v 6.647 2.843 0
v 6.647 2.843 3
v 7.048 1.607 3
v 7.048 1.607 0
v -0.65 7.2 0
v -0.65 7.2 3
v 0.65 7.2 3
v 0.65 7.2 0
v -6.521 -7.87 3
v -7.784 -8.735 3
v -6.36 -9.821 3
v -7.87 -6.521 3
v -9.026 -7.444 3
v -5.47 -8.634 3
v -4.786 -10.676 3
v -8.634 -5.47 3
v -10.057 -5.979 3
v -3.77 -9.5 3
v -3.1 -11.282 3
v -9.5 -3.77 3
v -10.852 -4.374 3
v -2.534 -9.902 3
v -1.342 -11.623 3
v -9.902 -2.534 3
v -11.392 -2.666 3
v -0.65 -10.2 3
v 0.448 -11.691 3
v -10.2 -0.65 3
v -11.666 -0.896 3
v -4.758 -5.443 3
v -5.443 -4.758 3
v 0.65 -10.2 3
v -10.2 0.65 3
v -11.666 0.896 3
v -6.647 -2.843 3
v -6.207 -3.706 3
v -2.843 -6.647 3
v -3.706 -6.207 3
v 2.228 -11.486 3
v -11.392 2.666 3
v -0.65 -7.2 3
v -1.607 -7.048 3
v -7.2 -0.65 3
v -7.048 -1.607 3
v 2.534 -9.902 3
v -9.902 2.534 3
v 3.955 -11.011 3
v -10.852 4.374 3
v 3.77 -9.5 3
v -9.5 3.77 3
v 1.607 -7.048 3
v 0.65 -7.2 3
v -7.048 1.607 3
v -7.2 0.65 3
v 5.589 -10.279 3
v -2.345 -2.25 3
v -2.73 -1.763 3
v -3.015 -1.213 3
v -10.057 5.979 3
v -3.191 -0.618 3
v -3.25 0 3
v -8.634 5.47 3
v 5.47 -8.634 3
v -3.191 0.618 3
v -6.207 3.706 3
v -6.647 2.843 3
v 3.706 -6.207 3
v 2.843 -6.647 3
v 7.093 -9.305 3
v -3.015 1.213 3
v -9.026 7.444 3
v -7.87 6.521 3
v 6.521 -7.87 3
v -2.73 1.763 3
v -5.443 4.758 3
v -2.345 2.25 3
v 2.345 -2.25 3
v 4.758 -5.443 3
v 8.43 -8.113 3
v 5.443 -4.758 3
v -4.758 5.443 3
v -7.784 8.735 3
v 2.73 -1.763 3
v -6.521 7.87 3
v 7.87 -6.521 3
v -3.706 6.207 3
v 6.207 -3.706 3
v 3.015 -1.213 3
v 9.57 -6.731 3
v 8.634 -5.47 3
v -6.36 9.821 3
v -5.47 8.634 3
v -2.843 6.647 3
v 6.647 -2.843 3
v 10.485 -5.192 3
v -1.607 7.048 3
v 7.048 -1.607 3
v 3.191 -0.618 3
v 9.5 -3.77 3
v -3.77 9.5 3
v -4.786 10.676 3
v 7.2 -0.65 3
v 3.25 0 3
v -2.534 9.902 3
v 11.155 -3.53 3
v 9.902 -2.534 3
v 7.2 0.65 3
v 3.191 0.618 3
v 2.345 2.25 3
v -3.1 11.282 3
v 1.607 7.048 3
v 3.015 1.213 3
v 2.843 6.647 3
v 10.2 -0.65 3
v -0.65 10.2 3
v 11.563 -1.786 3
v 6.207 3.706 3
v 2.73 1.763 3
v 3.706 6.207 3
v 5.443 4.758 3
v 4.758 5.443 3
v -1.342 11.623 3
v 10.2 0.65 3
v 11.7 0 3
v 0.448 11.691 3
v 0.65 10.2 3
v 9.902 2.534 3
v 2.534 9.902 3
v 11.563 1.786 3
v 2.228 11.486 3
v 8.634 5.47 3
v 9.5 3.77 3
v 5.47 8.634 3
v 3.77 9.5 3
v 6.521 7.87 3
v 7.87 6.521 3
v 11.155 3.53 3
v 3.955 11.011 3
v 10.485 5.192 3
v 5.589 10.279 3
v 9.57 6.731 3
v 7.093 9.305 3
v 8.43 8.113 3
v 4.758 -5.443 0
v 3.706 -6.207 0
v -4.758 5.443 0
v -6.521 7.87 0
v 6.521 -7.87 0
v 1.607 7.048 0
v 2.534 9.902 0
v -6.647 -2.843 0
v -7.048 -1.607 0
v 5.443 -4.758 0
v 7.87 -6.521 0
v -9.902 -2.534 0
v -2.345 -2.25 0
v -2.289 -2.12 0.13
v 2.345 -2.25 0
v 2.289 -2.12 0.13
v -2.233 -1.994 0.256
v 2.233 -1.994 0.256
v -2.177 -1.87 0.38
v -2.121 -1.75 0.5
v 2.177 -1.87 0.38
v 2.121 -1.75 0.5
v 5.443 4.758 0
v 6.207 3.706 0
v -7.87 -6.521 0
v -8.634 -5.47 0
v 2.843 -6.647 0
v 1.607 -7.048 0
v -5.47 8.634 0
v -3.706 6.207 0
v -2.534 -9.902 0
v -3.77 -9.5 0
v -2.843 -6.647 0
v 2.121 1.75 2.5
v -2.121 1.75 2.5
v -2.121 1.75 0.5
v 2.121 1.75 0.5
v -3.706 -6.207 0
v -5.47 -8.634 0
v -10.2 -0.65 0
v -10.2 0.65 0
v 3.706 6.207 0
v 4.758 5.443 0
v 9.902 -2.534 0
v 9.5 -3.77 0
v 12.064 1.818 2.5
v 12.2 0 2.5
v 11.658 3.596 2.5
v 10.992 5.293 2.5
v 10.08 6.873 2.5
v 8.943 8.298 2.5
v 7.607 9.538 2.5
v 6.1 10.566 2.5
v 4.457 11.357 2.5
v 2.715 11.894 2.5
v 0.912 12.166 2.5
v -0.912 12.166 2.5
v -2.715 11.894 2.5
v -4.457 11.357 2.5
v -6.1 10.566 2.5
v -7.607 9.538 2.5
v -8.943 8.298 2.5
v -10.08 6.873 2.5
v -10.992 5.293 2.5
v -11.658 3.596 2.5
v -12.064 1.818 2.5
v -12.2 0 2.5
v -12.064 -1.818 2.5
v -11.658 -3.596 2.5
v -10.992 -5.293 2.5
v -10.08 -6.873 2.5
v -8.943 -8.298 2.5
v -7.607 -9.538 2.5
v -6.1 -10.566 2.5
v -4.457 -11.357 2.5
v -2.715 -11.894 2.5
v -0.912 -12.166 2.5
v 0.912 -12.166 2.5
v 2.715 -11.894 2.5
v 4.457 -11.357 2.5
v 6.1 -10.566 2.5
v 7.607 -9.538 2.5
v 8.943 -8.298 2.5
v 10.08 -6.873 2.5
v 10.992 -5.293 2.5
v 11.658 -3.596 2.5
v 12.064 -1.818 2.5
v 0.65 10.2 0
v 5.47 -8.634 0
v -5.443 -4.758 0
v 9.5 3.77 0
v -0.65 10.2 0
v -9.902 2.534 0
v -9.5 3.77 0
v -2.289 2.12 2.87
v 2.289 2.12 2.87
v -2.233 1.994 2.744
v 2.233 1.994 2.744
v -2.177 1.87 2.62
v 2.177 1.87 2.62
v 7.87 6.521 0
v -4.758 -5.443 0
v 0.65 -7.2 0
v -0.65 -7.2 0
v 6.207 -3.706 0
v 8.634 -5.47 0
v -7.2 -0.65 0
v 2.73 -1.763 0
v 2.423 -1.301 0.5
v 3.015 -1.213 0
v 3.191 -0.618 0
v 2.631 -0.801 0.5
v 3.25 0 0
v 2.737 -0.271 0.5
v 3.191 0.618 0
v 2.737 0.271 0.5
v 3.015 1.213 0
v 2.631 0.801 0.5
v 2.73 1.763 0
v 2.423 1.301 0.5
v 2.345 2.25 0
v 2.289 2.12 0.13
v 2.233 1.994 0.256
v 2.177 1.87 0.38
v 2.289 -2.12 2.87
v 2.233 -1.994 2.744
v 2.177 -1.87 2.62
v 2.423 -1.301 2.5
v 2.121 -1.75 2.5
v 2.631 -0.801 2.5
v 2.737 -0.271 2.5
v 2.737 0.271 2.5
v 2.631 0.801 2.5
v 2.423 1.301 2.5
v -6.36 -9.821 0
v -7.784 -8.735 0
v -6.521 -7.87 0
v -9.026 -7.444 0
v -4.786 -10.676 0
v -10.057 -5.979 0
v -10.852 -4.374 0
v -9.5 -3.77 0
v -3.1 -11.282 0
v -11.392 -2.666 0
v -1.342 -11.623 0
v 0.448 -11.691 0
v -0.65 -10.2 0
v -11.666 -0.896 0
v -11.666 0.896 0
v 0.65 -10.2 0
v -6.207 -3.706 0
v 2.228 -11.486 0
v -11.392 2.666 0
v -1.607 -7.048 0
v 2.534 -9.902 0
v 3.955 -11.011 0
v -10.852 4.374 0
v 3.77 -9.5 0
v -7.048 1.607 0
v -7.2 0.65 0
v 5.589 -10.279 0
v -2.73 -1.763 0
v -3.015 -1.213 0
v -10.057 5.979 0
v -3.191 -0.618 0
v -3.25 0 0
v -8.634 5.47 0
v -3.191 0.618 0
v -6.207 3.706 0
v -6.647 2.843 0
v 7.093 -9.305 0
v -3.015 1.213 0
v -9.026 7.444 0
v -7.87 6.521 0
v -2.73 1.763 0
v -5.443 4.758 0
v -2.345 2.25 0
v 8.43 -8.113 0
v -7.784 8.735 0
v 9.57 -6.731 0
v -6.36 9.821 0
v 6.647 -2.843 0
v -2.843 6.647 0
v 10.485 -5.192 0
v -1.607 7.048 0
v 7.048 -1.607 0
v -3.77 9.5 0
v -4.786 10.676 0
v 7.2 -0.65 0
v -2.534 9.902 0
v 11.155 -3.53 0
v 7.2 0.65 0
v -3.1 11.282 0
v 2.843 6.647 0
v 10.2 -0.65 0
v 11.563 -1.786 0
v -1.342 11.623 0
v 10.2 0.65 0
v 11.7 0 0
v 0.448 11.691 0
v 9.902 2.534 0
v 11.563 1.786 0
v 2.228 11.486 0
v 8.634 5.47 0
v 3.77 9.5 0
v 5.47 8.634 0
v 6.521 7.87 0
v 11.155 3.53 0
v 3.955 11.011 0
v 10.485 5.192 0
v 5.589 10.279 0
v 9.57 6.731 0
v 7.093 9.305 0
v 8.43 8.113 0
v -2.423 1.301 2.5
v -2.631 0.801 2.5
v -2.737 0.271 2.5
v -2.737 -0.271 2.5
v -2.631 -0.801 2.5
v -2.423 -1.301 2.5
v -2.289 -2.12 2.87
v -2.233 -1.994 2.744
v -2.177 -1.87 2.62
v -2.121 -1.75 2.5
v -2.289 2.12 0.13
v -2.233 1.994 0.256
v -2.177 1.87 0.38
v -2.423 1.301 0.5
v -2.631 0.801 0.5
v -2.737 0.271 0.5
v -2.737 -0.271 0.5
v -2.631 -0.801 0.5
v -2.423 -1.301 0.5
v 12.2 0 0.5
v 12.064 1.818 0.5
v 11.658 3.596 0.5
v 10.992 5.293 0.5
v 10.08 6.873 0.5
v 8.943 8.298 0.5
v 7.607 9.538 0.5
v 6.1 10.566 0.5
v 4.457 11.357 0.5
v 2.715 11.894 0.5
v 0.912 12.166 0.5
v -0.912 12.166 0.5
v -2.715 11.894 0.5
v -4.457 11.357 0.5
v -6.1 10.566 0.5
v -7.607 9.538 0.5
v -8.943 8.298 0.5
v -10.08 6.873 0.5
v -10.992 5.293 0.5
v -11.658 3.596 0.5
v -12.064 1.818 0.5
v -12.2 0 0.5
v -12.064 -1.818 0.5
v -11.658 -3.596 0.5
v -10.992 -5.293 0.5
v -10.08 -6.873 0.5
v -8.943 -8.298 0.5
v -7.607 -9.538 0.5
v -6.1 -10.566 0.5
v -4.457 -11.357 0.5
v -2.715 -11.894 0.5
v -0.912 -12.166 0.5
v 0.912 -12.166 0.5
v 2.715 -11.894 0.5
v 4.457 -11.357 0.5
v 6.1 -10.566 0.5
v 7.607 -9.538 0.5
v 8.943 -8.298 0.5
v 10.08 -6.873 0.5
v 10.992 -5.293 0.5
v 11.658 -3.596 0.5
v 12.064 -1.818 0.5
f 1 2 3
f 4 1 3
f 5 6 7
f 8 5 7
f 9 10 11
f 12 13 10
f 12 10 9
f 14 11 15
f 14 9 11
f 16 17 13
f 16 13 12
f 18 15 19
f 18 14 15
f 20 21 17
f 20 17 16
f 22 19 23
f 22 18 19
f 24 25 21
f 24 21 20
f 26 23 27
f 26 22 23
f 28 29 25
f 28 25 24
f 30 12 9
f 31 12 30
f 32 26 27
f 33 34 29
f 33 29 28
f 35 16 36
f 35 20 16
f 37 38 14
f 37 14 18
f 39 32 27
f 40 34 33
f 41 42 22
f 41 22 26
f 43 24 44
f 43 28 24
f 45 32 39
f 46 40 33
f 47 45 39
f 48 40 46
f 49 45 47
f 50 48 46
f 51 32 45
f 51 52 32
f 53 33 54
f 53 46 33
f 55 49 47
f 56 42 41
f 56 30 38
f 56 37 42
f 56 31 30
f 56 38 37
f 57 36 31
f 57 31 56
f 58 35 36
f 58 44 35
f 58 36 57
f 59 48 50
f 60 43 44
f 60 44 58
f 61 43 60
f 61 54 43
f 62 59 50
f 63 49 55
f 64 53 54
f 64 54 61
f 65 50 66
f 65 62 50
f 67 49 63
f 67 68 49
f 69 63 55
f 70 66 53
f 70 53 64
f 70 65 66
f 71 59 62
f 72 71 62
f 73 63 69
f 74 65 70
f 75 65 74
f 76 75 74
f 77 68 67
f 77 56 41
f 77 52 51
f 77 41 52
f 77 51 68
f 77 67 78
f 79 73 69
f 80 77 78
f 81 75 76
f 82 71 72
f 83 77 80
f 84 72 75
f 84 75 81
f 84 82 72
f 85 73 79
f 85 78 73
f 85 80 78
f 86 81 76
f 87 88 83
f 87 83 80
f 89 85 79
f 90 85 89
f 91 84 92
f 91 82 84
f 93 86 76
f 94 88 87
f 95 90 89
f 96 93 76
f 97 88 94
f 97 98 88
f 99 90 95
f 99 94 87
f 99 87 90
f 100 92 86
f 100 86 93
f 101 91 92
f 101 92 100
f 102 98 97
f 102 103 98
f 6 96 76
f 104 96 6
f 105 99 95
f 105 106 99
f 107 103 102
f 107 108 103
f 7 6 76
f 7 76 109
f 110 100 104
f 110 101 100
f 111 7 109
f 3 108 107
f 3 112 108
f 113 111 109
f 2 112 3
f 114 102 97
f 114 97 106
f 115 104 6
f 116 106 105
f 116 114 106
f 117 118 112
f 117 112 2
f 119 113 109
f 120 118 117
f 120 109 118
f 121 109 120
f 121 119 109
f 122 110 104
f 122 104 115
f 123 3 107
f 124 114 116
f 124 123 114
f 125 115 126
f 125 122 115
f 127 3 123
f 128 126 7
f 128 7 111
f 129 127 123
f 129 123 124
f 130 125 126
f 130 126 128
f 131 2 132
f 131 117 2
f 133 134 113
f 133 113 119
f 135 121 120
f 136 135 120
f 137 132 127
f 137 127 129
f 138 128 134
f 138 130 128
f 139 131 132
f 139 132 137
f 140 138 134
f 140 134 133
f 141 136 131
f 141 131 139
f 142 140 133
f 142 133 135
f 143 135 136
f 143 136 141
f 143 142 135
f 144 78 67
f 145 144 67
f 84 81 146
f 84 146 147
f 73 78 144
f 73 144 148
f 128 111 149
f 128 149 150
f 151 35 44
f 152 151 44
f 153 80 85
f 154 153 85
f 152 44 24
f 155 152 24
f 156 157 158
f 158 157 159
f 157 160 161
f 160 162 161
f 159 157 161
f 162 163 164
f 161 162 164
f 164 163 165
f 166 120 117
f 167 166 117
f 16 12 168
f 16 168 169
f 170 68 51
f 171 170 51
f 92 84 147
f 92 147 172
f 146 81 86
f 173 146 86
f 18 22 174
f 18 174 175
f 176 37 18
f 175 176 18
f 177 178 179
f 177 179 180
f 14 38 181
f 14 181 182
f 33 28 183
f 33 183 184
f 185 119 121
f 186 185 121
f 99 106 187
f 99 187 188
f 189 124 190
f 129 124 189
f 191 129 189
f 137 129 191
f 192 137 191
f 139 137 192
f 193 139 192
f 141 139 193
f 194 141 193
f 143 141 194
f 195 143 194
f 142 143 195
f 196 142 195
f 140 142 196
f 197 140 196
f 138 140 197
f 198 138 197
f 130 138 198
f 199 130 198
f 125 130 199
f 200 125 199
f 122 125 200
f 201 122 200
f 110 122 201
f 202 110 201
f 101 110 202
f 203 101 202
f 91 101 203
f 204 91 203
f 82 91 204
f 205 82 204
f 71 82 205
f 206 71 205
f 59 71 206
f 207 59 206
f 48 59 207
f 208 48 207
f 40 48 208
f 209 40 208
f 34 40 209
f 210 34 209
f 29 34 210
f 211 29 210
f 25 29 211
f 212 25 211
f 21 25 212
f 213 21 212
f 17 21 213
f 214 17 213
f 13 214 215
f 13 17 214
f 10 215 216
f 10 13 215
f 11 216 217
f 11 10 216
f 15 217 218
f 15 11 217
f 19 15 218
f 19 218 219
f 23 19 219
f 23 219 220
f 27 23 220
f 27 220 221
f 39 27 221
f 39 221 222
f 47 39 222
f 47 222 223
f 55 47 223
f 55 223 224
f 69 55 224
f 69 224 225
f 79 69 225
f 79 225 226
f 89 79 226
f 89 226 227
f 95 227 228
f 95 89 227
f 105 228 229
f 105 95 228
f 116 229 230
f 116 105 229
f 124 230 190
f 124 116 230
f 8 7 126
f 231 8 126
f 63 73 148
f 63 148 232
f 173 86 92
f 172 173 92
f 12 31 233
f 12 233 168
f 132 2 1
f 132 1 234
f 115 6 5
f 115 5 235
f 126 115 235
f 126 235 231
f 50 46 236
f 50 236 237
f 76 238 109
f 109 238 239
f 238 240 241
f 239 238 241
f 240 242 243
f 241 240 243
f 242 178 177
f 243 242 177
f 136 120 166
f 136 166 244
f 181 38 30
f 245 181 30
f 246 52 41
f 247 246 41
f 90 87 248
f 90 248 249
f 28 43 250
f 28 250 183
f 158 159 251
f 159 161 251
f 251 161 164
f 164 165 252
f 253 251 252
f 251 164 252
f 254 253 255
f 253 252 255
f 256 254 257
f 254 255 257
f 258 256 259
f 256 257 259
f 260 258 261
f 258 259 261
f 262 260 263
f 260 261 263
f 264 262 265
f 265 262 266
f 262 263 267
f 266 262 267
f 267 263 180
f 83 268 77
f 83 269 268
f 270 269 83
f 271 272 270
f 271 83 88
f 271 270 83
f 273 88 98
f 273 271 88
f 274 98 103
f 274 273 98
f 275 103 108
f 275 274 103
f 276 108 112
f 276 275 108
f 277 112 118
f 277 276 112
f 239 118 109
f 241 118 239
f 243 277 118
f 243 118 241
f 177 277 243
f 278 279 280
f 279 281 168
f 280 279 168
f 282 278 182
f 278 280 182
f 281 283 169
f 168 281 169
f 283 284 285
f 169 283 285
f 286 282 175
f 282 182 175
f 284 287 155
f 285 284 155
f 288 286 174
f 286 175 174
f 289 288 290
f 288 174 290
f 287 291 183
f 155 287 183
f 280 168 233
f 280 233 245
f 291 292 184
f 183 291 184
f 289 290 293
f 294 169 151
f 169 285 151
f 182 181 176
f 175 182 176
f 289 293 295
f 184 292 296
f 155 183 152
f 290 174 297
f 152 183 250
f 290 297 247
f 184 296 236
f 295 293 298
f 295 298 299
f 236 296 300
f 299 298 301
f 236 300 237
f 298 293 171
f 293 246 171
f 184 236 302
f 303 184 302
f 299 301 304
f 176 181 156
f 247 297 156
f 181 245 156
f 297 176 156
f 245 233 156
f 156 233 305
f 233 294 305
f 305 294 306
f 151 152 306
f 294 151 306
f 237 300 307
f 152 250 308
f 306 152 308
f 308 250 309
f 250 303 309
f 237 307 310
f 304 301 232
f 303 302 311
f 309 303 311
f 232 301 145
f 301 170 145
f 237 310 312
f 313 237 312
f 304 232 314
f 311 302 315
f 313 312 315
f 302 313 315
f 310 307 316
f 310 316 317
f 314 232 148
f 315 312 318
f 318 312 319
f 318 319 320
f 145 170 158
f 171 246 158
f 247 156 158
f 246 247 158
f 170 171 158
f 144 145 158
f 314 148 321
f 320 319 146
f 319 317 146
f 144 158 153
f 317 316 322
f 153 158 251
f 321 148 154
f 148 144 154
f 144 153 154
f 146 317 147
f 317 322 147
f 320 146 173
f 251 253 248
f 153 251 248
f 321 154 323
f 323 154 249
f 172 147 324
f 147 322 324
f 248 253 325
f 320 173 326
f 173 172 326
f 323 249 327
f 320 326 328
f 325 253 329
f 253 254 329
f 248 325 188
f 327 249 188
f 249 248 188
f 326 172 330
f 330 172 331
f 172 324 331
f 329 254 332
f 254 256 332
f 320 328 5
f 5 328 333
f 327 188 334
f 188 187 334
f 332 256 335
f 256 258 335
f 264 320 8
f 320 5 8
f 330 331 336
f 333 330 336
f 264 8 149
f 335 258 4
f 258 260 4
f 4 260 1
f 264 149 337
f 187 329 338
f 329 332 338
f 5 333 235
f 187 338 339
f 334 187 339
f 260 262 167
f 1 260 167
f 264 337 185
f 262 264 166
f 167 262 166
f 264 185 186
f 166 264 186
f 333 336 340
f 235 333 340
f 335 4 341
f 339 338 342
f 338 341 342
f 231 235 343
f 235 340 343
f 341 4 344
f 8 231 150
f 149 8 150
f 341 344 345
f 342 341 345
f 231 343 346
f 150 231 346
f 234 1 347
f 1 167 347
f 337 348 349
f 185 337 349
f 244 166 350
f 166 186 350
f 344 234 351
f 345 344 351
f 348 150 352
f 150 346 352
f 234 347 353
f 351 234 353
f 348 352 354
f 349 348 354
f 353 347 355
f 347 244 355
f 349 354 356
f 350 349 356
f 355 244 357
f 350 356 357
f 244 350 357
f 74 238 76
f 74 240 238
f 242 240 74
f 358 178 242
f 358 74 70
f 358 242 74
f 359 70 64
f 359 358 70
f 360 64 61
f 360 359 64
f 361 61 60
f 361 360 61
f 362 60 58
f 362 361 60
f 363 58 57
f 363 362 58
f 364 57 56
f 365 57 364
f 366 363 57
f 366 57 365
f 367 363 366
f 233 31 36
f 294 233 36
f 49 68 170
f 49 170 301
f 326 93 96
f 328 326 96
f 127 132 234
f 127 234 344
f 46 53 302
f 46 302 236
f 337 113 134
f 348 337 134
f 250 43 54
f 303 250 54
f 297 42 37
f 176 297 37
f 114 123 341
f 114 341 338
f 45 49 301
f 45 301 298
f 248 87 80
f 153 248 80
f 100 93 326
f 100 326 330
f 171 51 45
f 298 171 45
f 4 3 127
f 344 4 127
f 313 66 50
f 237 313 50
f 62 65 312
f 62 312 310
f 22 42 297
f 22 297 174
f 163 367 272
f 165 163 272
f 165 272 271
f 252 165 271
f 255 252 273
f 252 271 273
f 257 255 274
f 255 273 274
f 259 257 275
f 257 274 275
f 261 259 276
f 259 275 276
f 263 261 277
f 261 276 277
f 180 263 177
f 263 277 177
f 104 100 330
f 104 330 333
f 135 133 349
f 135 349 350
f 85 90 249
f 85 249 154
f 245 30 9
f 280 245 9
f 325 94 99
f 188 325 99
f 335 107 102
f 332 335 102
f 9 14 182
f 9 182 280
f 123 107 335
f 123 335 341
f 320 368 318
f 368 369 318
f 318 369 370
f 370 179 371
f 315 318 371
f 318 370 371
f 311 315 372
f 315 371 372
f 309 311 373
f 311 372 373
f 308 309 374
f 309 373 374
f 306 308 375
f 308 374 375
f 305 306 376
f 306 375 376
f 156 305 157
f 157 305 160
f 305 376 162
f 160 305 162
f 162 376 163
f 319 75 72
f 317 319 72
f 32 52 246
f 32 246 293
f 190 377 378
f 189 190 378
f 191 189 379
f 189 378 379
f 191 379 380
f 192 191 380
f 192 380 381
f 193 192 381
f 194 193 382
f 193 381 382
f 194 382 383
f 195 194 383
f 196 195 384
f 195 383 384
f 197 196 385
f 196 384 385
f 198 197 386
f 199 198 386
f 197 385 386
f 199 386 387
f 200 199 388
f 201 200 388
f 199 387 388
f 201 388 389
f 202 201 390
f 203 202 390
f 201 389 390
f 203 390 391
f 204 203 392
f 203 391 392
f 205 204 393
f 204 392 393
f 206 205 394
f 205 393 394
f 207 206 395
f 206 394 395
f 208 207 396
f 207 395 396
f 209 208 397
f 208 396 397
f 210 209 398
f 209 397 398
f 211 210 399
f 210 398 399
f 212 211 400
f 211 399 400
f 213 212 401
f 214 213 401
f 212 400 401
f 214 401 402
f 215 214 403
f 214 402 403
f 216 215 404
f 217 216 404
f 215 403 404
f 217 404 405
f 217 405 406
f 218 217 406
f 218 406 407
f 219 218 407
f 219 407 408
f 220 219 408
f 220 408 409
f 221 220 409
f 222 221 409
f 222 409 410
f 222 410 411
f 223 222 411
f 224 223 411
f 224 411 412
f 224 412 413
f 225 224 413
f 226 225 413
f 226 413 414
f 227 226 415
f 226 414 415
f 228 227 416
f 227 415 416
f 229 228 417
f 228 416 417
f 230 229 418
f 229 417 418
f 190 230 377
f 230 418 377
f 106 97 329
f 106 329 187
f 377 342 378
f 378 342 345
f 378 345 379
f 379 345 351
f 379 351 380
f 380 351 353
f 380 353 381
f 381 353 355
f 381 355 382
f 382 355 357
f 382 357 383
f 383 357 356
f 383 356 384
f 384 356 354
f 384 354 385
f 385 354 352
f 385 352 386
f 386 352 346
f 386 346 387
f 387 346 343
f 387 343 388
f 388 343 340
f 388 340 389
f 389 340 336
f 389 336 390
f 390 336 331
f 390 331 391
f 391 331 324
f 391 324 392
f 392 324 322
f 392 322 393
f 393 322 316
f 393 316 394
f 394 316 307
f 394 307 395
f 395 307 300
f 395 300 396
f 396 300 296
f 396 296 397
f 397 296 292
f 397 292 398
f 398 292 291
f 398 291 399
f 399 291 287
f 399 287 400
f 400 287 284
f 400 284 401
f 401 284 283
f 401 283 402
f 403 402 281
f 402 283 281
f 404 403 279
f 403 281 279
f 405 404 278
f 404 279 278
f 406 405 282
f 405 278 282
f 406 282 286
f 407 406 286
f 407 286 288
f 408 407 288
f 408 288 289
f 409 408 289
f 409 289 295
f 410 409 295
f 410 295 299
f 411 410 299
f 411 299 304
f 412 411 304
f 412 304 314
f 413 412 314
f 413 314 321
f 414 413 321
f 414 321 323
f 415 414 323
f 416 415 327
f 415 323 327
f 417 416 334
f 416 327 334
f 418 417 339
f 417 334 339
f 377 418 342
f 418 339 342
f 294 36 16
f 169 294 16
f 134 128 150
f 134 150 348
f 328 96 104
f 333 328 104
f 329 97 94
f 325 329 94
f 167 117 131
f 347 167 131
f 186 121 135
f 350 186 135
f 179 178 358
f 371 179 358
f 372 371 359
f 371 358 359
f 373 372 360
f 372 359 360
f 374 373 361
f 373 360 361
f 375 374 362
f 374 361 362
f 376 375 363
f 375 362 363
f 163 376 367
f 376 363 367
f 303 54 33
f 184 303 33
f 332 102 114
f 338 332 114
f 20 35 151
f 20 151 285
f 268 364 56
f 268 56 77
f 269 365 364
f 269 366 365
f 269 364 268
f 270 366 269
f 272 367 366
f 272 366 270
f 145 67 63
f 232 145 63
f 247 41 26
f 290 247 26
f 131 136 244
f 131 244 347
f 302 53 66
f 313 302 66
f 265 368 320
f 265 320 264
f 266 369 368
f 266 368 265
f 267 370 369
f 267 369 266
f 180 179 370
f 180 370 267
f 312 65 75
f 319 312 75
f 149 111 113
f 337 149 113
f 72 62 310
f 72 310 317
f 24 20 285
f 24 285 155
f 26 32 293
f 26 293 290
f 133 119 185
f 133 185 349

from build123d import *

# Parameters (mm, degrees)
SKETCH002_R        = 12.2
PAD_DEPTH          = 3
POCKET_DEPTH       = 3.001
SKETCH003_W        = 1.3
SKETCH003_H        = 3
POCKET001_DEPTH    = 72.274949
POLARPATTERN_COUNT = 20
CHAMFER_SIZE       = 0.5


with BuildPart() as part:
    # Sketch002 → Pad (new body)
    with BuildSketch(Plane.XY):
        Circle(SKETCH002_R)
    extrude(amount=PAD_DEPTH)

    # Sketch → Pocket (cut, through all)
    with BuildSketch(Plane.XY.offset(3)):
        with BuildLine():
            Line((-2.12132, 1.75), (2.12132, 1.75))
            ThreePointArc((2.12132, -1.75), (2.75, 0), (2.12132, 1.75))
            Line((-2.12132, -1.75), (2.12132, -1.75))
            ThreePointArc((-2.12132, 1.75), (-2.75, 0), (-2.12132, -1.75))
        make_face()
    extrude(amount=-POCKET_DEPTH, mode=Mode.SUBTRACT)

    # Sketch003 → Pocket001 (cut, through all)
    with BuildSketch(Plane.XY.offset(3)):
        with Locations((0, 8.7)):
            Rectangle(SKETCH003_W, SKETCH003_H)
    pocket001 = extrude(amount=-POCKET001_DEPTH, mode=Mode.SUBTRACT)

    # PolarPattern: Pocket001 ×20 about axis
    polarpattern_axis = Axis((0, 0, 3), (0, 0, 1))
    for i in range(1, POLARPATTERN_COUNT):
        add(pocket001.rotate(polarpattern_axis, i * 360 / POLARPATTERN_COUNT), mode=Mode.SUBTRACT)

    # Chamfer
    chamfer_edges = [part.edges().sort_by_distance(p)[0] for p in [
        (-2.75, 0, 3),
        (0, 1.75, 3),
        (2.75, 0, 3),
        (0, -1.75, 3),
        (-12.2, 0, 3),
        (-12.2, 0, 0),
        (-2.75, 0, 0),
        (0, 1.75, 0),
        (0, -1.75, 0),
        (2.75, 0, 0),
    ]]
    chamfer(chamfer_edges, length=CHAMFER_SIZE)


solid = part.part
